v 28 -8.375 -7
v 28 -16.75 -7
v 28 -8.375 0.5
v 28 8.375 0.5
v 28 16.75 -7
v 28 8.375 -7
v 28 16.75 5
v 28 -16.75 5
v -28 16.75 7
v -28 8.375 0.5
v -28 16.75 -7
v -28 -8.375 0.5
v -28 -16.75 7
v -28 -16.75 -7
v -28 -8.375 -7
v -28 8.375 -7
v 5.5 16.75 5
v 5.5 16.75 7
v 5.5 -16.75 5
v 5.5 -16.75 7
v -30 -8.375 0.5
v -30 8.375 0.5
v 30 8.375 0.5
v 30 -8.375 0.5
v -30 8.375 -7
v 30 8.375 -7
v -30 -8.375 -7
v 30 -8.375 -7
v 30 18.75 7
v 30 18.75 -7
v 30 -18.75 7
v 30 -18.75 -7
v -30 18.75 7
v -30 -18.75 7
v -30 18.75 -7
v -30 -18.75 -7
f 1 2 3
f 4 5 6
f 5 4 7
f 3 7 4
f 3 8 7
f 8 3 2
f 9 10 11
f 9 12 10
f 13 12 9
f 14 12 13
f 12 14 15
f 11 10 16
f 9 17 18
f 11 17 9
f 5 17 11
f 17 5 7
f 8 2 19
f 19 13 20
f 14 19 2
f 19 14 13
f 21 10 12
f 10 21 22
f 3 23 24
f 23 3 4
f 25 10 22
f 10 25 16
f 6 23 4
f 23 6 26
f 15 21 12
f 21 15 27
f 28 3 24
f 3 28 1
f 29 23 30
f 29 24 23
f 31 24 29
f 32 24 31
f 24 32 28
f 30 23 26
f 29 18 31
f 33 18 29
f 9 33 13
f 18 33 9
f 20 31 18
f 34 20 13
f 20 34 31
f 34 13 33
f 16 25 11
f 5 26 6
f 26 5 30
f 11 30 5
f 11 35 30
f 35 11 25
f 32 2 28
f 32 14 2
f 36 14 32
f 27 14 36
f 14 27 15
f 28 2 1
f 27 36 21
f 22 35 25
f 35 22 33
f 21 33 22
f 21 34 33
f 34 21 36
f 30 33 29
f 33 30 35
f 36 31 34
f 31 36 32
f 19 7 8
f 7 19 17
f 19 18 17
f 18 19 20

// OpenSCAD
length = 56;
width = 33.5;
depth = 12;
prodWidth = 2;

outerLength = length + (prodWidth*2);
outerWidth = width + (prodWidth*2);
outerDepth = depth + (prodWidth);

module main()  {  
   casing_offset = 1; 
    
    //sub cover
                translate([35/2, 0, depth/2]) {
                    cube([24, outerWidth, prodWidth], true); 
                } 
                
     module lid() {   
        ///  lid
        difference() {
            union() {
                
                
                //backing inner
                translate([0, 0, prodWidth-depth]) {
                    cube([length, width, prodWidth], true);  
                }  
                //backing
                translate([0, 0, -depth]) {
                    cube([outerLength, outerWidth, prodWidth], true); 
                } 
            }
           
        }
    }
    
    module case() {    
        difference() {
            union() {
                
                //main
                cube([outerLength, outerWidth, outerDepth], true);  
                
                
                
            }
            
            union() {
                
                // logo
//                translate([50, prodWidth+15.5, prodWidth+height+4]) {
//                    scale([0.08, 0.08, 0.01]) {
//                        surface(file = "falcon.png", center = true, invert = true);
//                    }
//                }
                
                // cavity
                translate([0, 0, 0]) {
                    cube([length, width, depth+5], true);  
                }  
                
                translate([0, 0, -8]) {
                    cube([length+10, width/2, depth+5], true);  
                }  
                
            }
            
        }
    }
   

   case();
   //lid();

}

main();
